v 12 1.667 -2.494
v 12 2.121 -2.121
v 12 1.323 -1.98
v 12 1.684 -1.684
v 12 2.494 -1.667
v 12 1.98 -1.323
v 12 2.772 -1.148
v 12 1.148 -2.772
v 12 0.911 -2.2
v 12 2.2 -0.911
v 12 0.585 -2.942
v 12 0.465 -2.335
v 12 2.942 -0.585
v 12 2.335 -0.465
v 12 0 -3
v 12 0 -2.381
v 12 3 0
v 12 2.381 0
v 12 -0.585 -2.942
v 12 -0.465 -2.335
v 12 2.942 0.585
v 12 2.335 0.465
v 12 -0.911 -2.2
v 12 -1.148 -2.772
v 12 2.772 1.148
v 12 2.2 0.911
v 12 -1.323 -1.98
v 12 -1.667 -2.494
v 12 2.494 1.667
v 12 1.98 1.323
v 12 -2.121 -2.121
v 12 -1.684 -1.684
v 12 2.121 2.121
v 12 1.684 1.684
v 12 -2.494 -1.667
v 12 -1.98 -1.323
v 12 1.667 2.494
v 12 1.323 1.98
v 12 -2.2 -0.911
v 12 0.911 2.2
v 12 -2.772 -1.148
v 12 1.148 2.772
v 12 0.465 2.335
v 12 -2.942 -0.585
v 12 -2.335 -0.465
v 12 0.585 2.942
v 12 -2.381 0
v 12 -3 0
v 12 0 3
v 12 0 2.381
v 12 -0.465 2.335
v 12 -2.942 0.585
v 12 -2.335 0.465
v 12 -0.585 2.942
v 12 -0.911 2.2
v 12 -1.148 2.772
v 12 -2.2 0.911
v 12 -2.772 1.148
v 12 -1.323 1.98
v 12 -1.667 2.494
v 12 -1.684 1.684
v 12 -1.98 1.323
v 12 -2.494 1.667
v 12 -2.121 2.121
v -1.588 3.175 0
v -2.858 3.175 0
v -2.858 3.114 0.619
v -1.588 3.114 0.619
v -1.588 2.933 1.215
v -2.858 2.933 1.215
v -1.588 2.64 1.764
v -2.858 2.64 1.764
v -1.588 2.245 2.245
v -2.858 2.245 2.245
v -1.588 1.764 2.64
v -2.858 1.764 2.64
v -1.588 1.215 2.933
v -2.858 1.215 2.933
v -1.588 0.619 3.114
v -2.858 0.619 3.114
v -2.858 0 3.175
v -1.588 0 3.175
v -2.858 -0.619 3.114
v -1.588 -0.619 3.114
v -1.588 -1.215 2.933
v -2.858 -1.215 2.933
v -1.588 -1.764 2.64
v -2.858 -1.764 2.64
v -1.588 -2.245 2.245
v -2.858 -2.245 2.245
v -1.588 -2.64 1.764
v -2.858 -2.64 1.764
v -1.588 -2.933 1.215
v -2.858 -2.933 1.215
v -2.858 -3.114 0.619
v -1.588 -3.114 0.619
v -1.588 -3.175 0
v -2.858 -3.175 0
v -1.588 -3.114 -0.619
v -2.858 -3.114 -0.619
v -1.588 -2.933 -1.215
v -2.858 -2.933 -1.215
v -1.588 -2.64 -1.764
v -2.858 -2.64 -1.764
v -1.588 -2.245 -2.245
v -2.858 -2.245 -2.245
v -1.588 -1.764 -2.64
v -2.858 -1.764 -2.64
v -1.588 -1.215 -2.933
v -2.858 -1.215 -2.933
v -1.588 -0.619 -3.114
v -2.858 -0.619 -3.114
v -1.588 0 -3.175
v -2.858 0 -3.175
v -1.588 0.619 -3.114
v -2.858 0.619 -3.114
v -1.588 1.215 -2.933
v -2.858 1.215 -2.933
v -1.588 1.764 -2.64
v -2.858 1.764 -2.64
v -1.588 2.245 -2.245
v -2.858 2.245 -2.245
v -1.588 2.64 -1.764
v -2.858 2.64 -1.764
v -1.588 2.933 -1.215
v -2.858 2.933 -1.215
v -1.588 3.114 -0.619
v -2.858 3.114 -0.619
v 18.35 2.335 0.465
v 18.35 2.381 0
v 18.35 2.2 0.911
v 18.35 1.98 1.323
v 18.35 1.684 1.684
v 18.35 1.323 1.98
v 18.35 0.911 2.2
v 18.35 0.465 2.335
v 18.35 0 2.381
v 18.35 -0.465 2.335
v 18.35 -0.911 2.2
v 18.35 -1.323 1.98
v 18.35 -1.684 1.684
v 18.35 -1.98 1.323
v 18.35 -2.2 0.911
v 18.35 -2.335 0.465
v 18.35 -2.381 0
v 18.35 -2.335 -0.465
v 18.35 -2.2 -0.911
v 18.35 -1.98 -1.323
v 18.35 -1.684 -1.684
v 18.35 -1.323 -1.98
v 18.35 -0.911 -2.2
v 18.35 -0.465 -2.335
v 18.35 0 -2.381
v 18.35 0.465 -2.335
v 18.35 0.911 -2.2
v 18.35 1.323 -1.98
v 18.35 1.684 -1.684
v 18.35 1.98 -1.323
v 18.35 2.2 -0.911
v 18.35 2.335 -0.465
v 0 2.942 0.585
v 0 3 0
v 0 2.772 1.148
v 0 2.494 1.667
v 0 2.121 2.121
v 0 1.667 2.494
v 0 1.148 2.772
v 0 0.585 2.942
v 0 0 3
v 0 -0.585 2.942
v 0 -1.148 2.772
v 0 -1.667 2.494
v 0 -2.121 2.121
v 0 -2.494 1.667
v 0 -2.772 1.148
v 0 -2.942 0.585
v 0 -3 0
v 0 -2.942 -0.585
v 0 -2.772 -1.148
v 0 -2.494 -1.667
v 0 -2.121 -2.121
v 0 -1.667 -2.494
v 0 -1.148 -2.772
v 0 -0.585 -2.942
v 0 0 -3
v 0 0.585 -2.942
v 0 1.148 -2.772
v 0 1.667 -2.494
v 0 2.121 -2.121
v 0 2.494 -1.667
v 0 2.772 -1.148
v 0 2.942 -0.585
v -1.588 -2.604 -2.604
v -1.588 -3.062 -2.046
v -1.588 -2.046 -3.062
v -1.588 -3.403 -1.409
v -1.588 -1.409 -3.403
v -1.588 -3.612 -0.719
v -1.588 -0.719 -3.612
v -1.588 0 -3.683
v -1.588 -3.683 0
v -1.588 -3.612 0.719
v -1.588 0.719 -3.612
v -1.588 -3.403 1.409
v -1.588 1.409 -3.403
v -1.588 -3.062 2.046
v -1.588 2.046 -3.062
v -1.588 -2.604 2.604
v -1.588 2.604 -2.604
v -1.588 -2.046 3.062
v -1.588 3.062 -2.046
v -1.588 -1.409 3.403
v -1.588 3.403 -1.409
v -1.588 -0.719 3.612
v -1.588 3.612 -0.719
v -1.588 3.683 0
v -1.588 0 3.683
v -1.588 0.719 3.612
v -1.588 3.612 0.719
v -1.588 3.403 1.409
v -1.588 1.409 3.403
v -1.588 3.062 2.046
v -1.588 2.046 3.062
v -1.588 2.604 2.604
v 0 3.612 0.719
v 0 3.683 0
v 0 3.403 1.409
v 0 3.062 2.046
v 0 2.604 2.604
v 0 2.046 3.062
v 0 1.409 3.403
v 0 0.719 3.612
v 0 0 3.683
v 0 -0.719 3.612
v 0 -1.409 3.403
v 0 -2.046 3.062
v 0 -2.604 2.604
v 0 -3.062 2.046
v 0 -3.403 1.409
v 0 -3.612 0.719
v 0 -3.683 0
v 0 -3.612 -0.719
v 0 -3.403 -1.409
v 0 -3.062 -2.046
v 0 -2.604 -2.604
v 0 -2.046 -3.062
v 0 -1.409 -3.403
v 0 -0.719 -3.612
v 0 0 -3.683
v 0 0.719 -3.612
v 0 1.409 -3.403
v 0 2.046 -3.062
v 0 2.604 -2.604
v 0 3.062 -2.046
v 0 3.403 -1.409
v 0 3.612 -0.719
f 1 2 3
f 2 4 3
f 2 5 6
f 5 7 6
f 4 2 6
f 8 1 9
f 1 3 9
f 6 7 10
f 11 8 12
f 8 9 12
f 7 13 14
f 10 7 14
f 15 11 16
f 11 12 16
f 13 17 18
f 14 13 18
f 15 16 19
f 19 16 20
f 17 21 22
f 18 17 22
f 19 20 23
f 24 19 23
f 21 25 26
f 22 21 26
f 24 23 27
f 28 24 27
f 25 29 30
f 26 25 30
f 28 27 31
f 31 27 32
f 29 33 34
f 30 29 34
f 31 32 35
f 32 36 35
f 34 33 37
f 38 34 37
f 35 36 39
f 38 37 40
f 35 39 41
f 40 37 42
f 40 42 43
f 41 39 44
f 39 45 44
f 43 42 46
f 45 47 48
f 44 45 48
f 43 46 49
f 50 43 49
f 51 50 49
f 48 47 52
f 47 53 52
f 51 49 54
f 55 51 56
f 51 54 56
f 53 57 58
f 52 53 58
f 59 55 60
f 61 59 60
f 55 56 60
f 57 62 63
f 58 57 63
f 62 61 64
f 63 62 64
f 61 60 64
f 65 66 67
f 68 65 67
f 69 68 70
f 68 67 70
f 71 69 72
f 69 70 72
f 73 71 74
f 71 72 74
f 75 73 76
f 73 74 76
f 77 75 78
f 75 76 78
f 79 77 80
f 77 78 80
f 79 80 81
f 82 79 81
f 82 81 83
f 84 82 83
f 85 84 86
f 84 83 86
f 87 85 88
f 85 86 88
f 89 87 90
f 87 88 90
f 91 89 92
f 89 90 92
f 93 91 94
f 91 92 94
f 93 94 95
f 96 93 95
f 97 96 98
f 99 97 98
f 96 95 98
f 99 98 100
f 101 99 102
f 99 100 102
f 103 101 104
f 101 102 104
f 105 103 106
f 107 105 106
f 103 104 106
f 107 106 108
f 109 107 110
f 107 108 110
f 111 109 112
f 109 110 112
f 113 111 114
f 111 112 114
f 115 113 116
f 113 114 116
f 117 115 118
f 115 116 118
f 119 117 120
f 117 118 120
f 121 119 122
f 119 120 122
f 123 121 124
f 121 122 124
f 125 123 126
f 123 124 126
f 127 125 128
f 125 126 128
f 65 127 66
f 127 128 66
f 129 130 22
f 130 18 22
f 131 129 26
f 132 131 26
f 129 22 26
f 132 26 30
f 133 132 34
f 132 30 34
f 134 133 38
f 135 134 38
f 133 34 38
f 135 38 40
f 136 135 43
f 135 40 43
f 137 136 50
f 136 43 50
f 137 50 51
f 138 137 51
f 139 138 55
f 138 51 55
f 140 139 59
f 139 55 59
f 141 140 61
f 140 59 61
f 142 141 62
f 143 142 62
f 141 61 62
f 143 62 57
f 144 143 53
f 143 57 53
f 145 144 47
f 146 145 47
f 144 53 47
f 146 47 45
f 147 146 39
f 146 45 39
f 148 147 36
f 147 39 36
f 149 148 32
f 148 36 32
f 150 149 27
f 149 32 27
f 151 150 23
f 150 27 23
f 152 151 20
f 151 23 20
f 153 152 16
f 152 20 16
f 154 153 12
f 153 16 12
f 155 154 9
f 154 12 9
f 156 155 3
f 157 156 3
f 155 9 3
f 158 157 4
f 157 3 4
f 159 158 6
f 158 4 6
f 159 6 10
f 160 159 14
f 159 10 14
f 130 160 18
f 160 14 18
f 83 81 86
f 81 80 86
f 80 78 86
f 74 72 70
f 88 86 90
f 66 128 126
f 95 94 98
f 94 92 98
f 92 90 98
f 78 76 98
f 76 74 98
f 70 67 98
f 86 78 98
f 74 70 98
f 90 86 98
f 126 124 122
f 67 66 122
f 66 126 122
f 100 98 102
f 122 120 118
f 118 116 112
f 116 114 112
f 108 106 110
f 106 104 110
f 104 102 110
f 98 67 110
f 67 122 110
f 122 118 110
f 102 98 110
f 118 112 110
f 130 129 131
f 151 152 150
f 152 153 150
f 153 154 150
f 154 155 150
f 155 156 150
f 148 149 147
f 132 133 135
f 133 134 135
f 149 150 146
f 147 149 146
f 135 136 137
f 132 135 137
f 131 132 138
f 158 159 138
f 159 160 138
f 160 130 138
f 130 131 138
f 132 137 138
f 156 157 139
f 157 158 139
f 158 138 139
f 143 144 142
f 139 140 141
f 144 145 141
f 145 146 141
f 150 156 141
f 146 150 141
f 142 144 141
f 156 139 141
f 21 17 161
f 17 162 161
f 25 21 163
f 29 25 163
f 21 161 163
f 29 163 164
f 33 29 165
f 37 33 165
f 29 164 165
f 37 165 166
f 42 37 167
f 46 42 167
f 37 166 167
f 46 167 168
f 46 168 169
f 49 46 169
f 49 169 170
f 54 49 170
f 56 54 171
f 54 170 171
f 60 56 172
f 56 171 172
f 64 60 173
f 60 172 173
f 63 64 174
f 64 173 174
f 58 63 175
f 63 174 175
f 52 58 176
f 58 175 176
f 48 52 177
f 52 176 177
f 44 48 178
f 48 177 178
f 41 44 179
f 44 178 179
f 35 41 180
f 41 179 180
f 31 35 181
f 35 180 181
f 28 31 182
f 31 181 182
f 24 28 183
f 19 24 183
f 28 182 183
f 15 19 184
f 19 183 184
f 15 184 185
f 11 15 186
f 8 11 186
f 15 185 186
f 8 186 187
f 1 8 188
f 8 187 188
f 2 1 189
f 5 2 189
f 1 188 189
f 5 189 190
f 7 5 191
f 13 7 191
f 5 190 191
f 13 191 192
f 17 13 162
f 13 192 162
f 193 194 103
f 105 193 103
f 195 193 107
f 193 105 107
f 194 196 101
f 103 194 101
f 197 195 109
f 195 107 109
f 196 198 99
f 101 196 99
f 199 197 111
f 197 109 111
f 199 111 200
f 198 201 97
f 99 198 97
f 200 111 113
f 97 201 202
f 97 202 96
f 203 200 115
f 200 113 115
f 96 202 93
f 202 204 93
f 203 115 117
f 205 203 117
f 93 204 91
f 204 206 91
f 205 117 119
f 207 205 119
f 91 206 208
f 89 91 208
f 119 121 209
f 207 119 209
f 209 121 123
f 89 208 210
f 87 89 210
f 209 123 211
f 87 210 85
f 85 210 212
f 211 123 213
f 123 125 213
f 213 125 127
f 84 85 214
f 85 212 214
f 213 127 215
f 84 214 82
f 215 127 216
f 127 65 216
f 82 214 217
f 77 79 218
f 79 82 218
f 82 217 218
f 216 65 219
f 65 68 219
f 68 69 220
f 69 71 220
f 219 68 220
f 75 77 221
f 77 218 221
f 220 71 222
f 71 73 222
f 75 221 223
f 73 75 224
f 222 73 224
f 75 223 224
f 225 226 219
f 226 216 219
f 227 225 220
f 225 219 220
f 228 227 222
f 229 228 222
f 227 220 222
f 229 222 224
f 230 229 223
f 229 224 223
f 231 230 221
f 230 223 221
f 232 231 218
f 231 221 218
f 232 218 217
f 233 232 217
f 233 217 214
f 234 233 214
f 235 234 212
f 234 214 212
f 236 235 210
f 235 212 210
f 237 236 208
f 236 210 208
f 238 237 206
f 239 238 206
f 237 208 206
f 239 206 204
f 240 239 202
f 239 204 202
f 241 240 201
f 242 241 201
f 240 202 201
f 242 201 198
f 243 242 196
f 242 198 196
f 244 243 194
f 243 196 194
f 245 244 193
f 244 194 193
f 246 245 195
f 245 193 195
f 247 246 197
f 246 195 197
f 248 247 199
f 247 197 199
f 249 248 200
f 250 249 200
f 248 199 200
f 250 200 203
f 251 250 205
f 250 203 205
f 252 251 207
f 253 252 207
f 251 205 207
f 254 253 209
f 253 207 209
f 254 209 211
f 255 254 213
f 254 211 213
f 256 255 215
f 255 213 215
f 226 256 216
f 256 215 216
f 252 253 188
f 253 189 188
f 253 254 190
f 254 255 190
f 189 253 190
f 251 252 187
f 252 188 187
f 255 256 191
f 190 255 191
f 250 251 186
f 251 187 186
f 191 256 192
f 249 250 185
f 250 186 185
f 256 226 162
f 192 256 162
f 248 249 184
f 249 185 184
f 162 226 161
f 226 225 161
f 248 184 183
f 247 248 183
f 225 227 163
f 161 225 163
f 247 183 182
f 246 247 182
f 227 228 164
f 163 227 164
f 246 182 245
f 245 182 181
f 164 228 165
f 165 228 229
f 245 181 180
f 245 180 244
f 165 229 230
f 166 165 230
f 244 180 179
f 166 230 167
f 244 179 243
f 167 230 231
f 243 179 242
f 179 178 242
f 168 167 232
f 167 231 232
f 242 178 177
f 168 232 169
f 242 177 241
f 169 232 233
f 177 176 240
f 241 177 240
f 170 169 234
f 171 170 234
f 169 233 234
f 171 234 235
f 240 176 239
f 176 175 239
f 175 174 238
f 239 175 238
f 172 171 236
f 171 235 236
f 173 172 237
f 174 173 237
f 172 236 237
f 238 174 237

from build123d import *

# Parameters (mm, degrees)
SKETCH2_R          = 6.35
CUT_EXTRUDE1_DEPTH = 4.4925


with BuildPart() as part:
    # Sketch1 → Revolve1 (revolve)
    with BuildSketch(Plane.XY):
        Polygon((-6.35, 0), (18.35, 0), (18.35, 2.38125), (12, 2.38125), (12, 3), (0, 3), (0, 3.683), (-1.5875, 3.683), (-1.5875, 3.175), (-6.35, 3.175), align=None)
    revolve(axis=Axis((-160.130718954, 0, 0), (1, 0, 0)))

    # Sketch2 → Cut-Extrude1 (cut, through all)
    with BuildSketch(Plane(origin=(-2.8575, -8.19662542, -7.078645384), x_dir=(0, -0.923004378, -0.384789447), z_dir=(1, 0, 0))):
        with Locations((-10.289309191, -3.379645711)):
            Circle(SKETCH2_R)
    extrude(amount=-CUT_EXTRUDE1_DEPTH, mode=Mode.SUBTRACT)


solid = part.part
